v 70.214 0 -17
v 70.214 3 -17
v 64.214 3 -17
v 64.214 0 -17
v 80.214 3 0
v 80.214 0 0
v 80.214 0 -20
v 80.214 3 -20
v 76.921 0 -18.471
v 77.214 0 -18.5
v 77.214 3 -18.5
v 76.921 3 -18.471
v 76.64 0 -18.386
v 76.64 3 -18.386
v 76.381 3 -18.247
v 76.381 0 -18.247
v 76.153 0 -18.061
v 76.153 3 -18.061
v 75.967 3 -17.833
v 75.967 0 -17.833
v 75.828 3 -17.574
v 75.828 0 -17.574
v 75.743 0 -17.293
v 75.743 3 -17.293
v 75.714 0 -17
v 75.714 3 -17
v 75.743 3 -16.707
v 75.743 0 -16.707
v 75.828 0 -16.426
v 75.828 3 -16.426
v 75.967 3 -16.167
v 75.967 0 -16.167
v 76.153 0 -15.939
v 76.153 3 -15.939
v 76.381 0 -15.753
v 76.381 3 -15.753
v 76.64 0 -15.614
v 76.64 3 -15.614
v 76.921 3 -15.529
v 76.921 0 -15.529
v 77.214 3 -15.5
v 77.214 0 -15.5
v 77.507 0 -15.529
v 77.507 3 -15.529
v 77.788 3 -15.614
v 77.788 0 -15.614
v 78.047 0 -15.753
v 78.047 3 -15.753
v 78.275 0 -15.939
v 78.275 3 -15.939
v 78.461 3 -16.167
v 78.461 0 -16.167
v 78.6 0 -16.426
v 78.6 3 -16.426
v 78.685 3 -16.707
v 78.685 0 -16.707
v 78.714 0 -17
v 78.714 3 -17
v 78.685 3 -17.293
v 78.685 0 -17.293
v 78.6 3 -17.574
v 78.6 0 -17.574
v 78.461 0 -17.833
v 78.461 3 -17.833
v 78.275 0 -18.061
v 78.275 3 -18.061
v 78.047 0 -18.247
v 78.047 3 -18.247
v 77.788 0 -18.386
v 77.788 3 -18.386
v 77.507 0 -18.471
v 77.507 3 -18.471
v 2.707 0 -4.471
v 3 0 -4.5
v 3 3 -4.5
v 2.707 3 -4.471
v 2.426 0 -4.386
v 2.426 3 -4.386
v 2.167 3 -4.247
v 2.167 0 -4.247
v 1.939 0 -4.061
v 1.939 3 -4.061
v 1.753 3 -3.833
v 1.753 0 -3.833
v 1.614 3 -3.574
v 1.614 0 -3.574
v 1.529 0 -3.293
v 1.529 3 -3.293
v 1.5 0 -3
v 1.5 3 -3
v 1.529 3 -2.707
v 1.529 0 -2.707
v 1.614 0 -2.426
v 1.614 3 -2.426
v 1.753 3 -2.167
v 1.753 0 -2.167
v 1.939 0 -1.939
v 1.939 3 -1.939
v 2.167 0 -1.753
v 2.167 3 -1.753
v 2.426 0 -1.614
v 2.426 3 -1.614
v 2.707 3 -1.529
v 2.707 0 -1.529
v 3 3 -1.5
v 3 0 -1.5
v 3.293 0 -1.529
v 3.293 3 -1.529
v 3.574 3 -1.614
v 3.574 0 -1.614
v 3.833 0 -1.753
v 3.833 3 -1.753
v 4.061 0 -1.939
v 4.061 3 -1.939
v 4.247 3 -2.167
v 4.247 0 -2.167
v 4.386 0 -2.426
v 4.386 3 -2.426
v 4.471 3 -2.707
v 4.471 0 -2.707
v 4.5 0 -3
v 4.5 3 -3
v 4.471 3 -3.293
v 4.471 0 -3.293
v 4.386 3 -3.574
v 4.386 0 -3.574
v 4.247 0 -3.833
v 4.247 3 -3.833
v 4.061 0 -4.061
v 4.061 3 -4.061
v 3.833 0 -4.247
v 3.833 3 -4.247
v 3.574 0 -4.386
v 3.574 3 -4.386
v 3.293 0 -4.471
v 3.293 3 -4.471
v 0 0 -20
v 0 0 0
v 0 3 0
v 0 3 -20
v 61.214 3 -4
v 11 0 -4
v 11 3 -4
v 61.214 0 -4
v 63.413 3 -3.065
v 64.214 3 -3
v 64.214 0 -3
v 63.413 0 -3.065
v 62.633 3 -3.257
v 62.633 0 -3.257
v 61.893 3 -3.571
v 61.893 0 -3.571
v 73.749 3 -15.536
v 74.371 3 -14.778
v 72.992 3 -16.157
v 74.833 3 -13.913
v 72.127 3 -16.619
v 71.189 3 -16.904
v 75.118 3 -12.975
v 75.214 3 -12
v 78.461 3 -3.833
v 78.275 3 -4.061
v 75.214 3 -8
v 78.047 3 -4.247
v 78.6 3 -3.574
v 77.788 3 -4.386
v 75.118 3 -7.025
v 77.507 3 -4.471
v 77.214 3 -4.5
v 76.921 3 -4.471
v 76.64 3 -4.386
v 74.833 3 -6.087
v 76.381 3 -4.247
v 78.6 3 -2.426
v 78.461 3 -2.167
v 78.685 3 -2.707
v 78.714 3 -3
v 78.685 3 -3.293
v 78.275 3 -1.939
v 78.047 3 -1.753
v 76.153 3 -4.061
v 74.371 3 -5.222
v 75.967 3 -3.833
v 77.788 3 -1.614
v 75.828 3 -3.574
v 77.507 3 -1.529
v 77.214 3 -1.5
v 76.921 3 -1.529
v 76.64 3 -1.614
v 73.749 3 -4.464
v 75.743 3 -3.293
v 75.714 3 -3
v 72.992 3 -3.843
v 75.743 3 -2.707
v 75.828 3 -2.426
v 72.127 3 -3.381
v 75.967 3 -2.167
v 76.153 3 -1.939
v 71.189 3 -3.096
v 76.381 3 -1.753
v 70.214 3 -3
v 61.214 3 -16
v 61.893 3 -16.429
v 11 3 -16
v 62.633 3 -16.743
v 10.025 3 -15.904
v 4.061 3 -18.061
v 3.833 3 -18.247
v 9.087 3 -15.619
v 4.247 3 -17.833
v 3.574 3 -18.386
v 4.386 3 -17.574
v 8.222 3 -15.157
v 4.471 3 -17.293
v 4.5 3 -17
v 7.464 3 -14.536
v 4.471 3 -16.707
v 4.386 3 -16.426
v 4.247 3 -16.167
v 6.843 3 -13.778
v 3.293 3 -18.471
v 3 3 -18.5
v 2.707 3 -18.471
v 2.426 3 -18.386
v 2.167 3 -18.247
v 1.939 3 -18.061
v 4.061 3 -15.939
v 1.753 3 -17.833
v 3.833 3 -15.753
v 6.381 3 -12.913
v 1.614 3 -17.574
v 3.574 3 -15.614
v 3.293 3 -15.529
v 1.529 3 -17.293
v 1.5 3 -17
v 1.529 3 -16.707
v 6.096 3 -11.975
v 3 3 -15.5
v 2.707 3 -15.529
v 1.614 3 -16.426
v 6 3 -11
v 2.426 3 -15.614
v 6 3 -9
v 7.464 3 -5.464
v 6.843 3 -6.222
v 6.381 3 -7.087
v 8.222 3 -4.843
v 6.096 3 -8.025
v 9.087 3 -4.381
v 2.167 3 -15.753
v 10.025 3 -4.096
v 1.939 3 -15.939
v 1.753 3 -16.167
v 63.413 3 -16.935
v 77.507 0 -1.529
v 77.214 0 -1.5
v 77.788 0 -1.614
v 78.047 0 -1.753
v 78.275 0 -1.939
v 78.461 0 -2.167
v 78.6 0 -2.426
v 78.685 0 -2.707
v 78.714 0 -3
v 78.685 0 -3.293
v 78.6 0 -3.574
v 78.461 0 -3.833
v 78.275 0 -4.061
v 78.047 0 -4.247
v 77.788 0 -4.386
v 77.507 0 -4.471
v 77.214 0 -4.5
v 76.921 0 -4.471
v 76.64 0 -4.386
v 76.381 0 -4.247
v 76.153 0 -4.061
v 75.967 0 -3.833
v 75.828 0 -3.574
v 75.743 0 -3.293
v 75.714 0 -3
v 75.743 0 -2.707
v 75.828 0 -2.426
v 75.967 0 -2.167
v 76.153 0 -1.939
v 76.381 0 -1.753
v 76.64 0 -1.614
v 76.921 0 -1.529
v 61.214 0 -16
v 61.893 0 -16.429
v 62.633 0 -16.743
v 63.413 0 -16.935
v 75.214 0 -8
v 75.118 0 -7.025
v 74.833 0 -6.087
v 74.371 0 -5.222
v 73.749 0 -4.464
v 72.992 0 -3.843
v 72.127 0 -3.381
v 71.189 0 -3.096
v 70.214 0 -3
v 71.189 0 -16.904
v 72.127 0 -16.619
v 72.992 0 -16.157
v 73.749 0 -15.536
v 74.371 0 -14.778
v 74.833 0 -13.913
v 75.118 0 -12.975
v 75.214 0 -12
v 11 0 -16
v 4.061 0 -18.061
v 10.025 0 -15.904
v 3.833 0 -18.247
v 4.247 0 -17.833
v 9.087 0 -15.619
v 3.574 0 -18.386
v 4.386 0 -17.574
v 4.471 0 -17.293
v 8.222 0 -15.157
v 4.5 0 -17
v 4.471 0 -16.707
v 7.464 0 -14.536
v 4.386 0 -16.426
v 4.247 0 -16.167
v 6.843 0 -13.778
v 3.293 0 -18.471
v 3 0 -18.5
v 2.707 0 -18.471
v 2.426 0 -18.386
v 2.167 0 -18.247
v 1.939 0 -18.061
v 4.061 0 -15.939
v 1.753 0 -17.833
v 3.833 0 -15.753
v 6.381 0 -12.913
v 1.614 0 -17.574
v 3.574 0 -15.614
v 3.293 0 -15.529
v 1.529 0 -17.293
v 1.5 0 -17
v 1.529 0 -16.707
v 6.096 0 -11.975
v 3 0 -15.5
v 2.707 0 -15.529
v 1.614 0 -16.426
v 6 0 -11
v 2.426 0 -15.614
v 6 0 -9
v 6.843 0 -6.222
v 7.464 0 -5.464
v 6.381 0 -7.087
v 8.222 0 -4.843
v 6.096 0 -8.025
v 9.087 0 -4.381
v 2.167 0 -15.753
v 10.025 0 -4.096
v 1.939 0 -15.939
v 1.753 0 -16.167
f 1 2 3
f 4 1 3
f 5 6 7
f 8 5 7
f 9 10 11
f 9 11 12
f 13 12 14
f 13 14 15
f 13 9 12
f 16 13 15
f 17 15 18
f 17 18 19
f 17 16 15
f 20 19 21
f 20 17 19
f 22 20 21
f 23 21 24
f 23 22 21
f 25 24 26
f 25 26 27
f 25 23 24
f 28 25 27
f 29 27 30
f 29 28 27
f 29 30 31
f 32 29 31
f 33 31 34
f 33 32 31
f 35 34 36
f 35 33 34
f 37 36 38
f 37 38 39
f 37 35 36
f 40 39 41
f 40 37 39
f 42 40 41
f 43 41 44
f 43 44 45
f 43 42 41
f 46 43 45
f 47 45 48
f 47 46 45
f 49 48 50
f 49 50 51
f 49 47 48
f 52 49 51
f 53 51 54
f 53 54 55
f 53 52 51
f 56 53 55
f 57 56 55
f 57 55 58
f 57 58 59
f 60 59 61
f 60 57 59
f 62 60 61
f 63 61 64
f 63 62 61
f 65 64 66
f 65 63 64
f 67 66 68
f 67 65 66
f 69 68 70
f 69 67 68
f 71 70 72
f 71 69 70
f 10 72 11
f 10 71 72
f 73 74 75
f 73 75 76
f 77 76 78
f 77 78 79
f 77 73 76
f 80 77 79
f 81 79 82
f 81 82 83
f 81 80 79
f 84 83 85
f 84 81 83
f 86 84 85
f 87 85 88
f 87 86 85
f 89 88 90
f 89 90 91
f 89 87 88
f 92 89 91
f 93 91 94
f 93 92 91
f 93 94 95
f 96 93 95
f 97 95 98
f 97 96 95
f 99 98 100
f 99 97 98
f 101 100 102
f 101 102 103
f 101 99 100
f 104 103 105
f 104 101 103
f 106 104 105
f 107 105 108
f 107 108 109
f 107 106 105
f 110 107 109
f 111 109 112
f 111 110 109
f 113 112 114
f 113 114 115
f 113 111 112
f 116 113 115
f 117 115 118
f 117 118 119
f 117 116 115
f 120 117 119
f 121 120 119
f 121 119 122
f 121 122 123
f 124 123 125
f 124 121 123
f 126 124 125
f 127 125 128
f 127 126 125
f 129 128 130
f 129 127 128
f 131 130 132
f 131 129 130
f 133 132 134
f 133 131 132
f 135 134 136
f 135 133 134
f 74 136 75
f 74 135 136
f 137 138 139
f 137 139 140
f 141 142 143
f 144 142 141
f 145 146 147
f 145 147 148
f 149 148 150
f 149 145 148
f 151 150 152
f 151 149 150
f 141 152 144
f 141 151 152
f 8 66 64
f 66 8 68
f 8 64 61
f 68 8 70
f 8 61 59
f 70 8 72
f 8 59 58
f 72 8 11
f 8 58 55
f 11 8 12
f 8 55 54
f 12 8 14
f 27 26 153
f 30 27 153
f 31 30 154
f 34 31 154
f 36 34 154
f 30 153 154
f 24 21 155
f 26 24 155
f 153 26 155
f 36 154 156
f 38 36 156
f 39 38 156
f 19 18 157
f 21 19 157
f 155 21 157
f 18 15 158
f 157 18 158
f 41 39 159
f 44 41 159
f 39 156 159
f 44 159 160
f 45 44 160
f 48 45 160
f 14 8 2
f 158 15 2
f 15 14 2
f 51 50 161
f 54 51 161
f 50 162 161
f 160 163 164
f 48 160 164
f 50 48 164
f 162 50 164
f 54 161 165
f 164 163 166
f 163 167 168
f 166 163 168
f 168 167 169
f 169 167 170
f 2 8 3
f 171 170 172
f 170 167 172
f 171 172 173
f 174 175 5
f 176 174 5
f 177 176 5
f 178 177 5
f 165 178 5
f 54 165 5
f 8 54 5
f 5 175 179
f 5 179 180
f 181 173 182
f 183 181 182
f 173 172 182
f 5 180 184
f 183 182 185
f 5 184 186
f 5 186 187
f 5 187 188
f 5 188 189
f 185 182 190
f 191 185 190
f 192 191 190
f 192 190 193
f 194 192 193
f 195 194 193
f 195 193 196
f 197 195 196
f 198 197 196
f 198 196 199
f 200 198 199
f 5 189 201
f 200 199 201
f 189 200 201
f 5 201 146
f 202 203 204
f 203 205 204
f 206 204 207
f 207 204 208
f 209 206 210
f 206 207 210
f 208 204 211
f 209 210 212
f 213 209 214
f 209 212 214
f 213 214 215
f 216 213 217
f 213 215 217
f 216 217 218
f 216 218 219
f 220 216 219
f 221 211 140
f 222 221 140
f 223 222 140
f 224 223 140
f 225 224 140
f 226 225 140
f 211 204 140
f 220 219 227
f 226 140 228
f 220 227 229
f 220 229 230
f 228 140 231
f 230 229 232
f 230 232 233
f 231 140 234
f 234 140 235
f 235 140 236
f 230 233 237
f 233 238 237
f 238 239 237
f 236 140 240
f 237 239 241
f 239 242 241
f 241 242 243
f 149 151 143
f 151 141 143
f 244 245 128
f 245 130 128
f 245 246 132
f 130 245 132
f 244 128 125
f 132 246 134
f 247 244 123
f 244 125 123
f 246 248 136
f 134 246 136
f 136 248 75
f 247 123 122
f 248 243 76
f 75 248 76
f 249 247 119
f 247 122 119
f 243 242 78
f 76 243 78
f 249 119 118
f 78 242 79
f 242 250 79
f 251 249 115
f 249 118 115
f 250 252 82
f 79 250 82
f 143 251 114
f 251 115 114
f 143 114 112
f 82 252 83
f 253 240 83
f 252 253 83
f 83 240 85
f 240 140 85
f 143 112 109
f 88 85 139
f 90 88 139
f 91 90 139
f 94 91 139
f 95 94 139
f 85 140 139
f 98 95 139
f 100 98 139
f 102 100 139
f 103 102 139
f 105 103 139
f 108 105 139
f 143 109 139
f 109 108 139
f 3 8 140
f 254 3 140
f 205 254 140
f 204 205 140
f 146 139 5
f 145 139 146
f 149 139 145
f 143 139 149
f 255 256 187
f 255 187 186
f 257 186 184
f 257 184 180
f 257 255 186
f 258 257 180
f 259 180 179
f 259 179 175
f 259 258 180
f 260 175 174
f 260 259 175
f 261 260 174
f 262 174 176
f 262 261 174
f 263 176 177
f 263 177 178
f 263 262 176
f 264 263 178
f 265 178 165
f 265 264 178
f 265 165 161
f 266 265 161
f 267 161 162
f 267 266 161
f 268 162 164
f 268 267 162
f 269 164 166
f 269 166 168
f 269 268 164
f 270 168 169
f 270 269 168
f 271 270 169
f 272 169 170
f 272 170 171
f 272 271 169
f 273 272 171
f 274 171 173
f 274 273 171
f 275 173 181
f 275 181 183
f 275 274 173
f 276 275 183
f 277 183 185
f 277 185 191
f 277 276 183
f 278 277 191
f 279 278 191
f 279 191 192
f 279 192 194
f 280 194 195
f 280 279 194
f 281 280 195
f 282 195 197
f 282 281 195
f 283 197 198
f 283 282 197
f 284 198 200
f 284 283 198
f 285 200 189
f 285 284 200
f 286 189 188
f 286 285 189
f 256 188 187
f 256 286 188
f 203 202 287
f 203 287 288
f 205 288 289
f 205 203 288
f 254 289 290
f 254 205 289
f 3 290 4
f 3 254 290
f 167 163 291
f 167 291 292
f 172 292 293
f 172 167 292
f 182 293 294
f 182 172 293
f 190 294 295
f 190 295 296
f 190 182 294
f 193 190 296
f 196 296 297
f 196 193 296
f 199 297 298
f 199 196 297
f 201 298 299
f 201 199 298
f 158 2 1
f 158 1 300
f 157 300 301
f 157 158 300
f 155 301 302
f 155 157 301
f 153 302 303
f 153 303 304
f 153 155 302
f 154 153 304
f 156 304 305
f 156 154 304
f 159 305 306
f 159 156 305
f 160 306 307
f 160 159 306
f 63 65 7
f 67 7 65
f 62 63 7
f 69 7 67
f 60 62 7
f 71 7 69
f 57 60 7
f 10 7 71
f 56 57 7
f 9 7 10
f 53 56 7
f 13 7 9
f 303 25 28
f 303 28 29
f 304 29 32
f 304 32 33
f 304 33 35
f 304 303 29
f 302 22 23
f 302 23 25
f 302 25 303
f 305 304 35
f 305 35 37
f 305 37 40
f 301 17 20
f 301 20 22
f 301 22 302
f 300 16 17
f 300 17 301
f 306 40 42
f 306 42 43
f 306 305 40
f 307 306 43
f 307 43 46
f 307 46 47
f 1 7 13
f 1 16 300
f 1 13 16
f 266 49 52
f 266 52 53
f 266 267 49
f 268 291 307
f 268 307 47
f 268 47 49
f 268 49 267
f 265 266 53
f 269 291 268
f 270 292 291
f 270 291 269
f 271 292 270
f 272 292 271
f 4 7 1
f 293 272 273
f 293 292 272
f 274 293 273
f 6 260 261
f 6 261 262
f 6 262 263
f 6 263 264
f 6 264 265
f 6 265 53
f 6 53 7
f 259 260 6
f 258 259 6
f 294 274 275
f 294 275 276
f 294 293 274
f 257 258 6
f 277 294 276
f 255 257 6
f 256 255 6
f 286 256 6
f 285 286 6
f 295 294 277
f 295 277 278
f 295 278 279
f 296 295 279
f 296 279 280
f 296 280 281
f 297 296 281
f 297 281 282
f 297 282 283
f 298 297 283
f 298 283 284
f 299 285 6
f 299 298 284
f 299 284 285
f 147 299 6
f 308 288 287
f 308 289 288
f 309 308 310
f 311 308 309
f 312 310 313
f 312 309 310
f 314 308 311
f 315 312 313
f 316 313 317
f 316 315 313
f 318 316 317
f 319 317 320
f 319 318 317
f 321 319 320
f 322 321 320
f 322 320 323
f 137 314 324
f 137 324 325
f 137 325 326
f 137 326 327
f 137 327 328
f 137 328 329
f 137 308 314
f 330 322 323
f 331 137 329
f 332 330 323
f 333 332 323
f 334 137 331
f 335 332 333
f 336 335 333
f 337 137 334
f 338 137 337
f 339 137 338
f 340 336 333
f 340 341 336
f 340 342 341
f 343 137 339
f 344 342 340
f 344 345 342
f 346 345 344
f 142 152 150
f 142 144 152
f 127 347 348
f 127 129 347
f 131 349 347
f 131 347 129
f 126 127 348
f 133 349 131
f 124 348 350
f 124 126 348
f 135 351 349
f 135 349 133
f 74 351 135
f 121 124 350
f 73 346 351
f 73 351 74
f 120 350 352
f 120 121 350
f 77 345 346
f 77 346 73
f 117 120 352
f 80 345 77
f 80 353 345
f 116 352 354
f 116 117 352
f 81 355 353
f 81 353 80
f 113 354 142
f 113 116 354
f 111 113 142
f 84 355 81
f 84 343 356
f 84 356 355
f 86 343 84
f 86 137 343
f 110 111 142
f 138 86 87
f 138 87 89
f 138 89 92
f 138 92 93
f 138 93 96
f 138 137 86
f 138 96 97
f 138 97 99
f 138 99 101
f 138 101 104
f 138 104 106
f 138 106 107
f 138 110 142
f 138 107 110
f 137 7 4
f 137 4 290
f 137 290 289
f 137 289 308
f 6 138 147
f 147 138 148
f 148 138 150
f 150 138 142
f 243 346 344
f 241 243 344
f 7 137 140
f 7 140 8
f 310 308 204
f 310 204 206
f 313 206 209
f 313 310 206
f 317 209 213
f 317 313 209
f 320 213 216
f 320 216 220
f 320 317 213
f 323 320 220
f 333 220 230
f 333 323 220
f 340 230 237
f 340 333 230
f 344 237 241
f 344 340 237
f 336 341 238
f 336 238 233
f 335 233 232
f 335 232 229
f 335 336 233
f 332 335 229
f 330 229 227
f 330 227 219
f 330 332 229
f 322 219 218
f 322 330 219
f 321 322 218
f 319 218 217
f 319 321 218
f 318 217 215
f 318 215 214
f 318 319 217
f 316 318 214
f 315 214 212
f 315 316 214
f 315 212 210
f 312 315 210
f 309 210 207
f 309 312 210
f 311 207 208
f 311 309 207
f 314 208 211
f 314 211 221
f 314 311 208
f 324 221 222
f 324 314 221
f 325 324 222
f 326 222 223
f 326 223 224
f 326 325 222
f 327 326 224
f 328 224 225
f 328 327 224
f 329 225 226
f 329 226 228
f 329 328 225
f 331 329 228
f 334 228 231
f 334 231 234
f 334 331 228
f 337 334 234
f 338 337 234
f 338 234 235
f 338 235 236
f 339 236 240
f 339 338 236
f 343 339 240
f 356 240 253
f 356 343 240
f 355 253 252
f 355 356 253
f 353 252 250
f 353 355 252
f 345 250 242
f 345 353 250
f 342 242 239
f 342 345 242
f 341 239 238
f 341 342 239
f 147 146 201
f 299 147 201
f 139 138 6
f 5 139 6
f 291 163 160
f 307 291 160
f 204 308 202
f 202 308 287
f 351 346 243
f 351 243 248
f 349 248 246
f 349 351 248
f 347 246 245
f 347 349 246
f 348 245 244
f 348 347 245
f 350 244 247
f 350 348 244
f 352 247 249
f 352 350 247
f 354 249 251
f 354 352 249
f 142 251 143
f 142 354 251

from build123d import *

# Parameters (mm, degrees)
SKETCH1_W           = 80.213910902
SKETCH1_H           = 20
SKETCH1_R           = 1.5
SKETCH1_W_2         = 68.213910902
SKETCH1_H_2         = 12
BOSS_EXTRUDE1_DEPTH = 3
CUT_EXTRUDE1_DEPTH  = 83.724068458
FILLET1_R           = 5


with BuildPart() as part:
    # Sketch1 → Boss-Extrude1 (new body)
    with BuildSketch(Plane(origin=(0, 0, 0), x_dir=(1, 0, 0), z_dir=(0, 1, 0))):
        with Locations((40.106955451, 10)):
            Rectangle(SKETCH1_W, SKETCH1_H)
        with Locations(Location((3, 17, 0), (0, 0, 270))):
            Circle(SKETCH1_R, mode=Mode.SUBTRACT)
        with Locations(Location((3, 3, 0), (0, 0, 90))):
            Circle(SKETCH1_R, mode=Mode.SUBTRACT)
        with Locations(Location((77.213910902, 3, 0), (0, 0, 270))):
            Circle(SKETCH1_R, mode=Mode.SUBTRACT)
        with Locations(Location((77.213910902, 17, 0), (0, 0, 90))):
            Circle(SKETCH1_R, mode=Mode.SUBTRACT)
        with Locations((40.106955451, 10)):
            Rectangle(SKETCH1_W_2, SKETCH1_H_2, mode=Mode.SUBTRACT)
    extrude(amount=BOSS_EXTRUDE1_DEPTH)

    # Sketch2 → Cut-Extrude1 (cut, through all)
    with BuildSketch(Plane(origin=(0, 3, 0), x_dir=(1, 0, 0), z_dir=(0, 1, 0))):
        Polygon((61.213910902, 17), (61.213910902, 16), (74.213910902, 16), (74.213910902, 4), (61.213910902, 4), (61.213910902, 3), (75.213910902, 3), (75.213910902, 17), align=None)
    extrude(amount=-CUT_EXTRUDE1_DEPTH, mode=Mode.SUBTRACT)

    # Fillet1
    # the kernel refuses this fillet: 5 mm, written as the material it adds along each edge
    with BuildSketch(Plane(origin=(75.213910902, 3, -17), x_dir=(0, 0, 1), z_dir=(0, -1, 0)), Plane(origin=(75.213910902, 3, -3), x_dir=(-1, 0, 0), z_dir=(0, -1, 0)), Plane(origin=(6, 0, -16), x_dir=(0, 0, 1), z_dir=(0, 1, 0))) as fillet1_piece_1:
        with BuildLine():
            CenterArc((FILLET1_R, FILLET1_R), FILLET1_R, 180, 90)
            Line((0, FILLET1_R), (-FILLET1_R * 0.02, FILLET1_R))
            Line((-FILLET1_R * 0.02, FILLET1_R), (-FILLET1_R * 0.02, -FILLET1_R * 0.02))
            Line((-FILLET1_R * 0.02, -FILLET1_R * 0.02), (FILLET1_R, -FILLET1_R * 0.02))
            Line((FILLET1_R, -FILLET1_R * 0.02), (FILLET1_R, 0))
        make_face()
    extrude(amount=3)
    with BuildSketch(Plane(origin=(61.213910902, 3, -17), x_dir=(1, 0, 0), z_dir=(0, -1, 0))) as fillet1_piece_2:
        with BuildLine():
            CenterArc((3, 5), FILLET1_R, 233.130102354, 36.869897646)
            Line((0, 1), (-0.06, 0.92))
            ThreePointArc((-0.06, 0.92), (-0.1, 0.5), (-0.1, 0))
            Line((-0.1, 0), (0, -0.1))
            Line((0, -0.1), (3, -0.1))
            Line((3, -0.1), (3, 0))
        make_face()
    extrude(amount=3)
    with BuildSketch(Plane(origin=(61.213910902, 3, -3), x_dir=(0, 0, -1), z_dir=(0, -1, 0))) as fillet1_piece_3:
        with BuildLine():
            CenterArc((5, 3), FILLET1_R, 180, 36.869897646)
            Line((0, 3), (-0.1, 3))
            Line((-0.1, 3), (-0.1, 0))
            Line((-0.1, 0), (0, -0.1))
            ThreePointArc((0, -0.1), (0.5, -0.1), (0.92, -0.06))
            Line((0.92, -0.06), (1, 0))
        make_face()
    extrude(amount=3)
    with BuildSketch(Plane(origin=(6, 0, -4), x_dir=(0, 0, -1), z_dir=(0, 1, 0))) as fillet1_piece_4:
        with BuildLine():
            CenterArc((FILLET1_R, -FILLET1_R), FILLET1_R, 90, 90)
            Line((0, -FILLET1_R), (-FILLET1_R * 0.02, -FILLET1_R))
            Line((-FILLET1_R * 0.02, -FILLET1_R), (-FILLET1_R * 0.02, FILLET1_R * 0.02))
            Line((-FILLET1_R * 0.02, FILLET1_R * 0.02), (FILLET1_R, FILLET1_R * 0.02))
            Line((FILLET1_R, FILLET1_R * 0.02), (FILLET1_R, 0))
        make_face()
    extrude(amount=3)


solid = part.part
